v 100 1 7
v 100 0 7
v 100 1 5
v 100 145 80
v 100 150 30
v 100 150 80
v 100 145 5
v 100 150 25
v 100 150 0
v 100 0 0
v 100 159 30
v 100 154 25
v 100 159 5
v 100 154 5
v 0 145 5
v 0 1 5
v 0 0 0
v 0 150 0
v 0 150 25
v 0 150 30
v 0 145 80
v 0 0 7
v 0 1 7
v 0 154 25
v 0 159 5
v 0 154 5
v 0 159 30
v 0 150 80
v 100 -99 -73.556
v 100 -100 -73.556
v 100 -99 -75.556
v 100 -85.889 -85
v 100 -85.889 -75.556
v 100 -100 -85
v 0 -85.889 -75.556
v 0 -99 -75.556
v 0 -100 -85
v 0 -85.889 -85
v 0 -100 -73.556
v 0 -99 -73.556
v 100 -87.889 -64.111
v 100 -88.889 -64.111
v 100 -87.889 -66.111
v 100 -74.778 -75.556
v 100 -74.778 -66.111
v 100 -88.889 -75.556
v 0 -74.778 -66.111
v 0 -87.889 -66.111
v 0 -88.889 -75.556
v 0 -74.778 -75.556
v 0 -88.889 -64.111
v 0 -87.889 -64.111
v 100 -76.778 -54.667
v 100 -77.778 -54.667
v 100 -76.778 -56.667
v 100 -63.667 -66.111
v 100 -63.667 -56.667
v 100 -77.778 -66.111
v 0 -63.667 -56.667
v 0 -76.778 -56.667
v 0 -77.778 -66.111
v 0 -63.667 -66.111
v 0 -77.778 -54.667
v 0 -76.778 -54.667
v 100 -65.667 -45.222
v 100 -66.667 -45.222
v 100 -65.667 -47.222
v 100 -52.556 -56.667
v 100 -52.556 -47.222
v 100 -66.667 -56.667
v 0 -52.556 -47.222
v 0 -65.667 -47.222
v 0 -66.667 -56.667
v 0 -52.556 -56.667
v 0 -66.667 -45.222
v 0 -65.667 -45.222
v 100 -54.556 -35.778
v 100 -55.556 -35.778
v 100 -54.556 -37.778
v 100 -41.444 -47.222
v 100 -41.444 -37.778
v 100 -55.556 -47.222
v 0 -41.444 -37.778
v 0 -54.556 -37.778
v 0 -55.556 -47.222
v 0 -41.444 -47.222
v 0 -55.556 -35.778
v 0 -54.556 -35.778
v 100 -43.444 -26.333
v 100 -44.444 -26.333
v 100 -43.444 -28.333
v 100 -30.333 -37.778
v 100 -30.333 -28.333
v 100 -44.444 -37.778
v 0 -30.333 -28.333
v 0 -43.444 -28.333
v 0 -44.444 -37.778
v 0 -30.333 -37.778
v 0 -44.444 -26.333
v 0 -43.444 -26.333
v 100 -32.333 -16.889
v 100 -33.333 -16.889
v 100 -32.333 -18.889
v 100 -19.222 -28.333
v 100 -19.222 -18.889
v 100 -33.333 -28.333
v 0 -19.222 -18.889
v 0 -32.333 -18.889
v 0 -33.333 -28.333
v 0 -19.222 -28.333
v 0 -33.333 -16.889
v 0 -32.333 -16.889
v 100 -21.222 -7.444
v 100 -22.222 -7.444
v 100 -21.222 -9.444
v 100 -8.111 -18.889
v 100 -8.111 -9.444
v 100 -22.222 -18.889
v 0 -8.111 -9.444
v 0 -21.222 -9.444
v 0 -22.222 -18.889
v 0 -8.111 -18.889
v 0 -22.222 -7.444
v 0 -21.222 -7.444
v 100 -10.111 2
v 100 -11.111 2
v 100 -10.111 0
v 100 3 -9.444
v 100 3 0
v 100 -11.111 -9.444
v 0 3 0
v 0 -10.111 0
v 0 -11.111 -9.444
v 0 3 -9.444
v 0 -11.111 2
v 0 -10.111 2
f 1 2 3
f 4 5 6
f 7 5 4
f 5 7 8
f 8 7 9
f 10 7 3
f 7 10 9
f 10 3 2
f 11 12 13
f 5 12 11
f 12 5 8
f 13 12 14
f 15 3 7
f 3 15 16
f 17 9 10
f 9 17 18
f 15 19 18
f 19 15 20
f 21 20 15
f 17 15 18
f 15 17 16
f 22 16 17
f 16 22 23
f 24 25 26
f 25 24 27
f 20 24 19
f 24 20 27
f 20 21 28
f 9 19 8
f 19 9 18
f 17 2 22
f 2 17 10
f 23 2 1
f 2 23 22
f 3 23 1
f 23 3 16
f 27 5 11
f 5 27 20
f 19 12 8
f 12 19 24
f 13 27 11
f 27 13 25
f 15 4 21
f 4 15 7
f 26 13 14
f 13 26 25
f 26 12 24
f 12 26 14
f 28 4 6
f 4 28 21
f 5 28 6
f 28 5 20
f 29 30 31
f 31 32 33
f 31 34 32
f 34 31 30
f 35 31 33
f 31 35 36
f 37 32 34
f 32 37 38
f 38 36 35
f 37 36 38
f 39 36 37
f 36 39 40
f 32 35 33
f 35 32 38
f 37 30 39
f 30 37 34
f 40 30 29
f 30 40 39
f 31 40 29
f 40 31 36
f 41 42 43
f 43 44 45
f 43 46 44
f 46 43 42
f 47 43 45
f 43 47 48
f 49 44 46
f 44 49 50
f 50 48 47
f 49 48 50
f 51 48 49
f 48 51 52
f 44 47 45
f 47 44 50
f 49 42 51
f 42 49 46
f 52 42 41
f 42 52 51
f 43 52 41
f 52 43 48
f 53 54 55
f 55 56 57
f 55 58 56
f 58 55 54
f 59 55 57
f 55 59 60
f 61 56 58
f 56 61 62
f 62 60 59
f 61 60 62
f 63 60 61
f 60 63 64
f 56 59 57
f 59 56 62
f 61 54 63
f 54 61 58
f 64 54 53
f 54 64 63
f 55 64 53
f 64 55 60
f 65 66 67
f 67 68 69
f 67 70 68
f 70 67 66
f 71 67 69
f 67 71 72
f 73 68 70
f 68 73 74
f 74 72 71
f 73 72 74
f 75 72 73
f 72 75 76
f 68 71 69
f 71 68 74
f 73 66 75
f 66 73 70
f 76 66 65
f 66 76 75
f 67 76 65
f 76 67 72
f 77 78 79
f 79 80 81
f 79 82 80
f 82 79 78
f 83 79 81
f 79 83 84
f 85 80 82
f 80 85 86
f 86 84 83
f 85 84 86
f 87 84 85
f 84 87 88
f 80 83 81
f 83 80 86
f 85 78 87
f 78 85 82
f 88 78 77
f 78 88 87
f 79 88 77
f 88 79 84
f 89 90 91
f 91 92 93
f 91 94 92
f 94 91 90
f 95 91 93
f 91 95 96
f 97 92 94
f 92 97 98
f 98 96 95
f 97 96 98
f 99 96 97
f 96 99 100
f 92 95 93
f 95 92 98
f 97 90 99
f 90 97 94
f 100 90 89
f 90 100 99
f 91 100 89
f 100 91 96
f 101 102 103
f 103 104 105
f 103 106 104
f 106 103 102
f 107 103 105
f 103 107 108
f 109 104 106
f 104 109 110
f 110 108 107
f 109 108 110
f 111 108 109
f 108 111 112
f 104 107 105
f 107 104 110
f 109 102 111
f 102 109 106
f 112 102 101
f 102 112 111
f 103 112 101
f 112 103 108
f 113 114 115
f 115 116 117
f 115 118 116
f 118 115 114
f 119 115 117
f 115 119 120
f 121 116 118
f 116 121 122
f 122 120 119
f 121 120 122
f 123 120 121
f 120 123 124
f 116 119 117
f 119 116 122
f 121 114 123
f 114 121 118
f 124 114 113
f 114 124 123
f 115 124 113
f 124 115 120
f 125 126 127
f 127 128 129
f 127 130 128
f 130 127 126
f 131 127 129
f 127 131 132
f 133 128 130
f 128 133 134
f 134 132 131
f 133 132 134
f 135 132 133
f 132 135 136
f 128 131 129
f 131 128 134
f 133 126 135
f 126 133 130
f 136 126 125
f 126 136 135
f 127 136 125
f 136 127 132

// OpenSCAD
// Turtle Basking Spot for Aquarium
// All dimensions are parameterized for customization

// ===== PARAMETERS =====
// Main platform dimensions
platform_length = 100;     // Length of the basking platform (mm)
platform_width = 150;       // Width of the basking platform (mm)
platform_thickness = 5;    // Thickness of the platform (mm)

// Wall dimensions
wall_height = 20;          // Height of the back wall (mm)
wall_thickness = 5;        // Thickness of the wall (mm)
upper_wall_height = 50;    // Height of the upper wall above the hook (mm)

// Glass hook dimensions
hook_drop = 20;            // How far the hook drops down behind the glass (mm)
hook_thickness = 5;        // Thickness of the hook (mm)
glass_thickness = 4;       // Thickness of aquarium glass (mm)

// Ramp/stairs dimensions
ramp_width = 100;           // Width of the ramp (mm)
ramp_height = 85;         // Total depth of the ramp (how far down from platform) (mm)
ramp_length = 100;        // Total length of the steps area (mm)

// Ridge dimensions for better grip
ridge_height = 2;          // Height of ridges above step surface (mm)
ridge_width = 1;           // Width/thickness of each ridge (mm)

// ===== MAIN ASSEMBLY =====
turtle_basking_spot();

// Ramp/stairs positioned at the front of the platform
translate([platform_length/2 - ramp_width/2, -ramp_length, 0])
    ramp_stairs();

// ===== MODULES =====
module turtle_basking_spot() {
    union() {
        // Main platform
        basking_platform();
        
        // Back wall with glass hook
        translate([0, platform_width - wall_thickness, platform_thickness])
            back_wall_with_hook();
    }
}

module basking_platform() {
    union() {
        // Simple flat platform
        cube([platform_length, platform_width, platform_thickness]);
        
        // Add ridge at front edge for better grip
        translate([0, 0, platform_thickness])
            cube([platform_length, ridge_width, ridge_height]);
    }
}

module back_wall_with_hook() {
    union() {
        // Main wall
        cube([platform_length, wall_thickness, wall_height]);
        
        // Glass hook at the top
        translate([0, 0, wall_height])
            glass_hook();
        
        // Upper wall above the hook
        translate([0, 0, wall_height + hook_thickness])
            cube([platform_length, wall_thickness, upper_wall_height]);
    }
}

module glass_hook() {
    // L-shaped hook that goes over the glass edge with gap for glass
    union() {
        // Horizontal part (goes over the glass, extends to accommodate glass + hook material)
        translate([0, 0, 0])
            cube([platform_length, wall_thickness + glass_thickness + hook_thickness, hook_thickness]);
        
        // Vertical part (drops down behind the glass, positioned to create proper glass gap)
        translate([0, wall_thickness + glass_thickness, -hook_drop])
            cube([platform_length, hook_thickness, hook_drop]);
    }
}

module ramp_stairs() {
    // Calculate starting position - ramp goes down from platform level
    ramp_start_height = -ramp_height;

    // Calculate optimal step count and dimensions
    calculated_step_count = max(1, round(ramp_height / 10));
    actual_step_height = ramp_height / calculated_step_count;
    actual_step_length = ramp_length / calculated_step_count;
    
    // Create overlapping steps to prevent gaps
    for (i = [0 : calculated_step_count - 1]) {
        // Calculate step position
        step_y_position = i * actual_step_length;
        step_z_position = ramp_start_height + (i * actual_step_height);
        
        // Make each step extend to connect properly
        step_length_with_overlap = (i == calculated_step_count - 1) ? 
            ramp_length - step_y_position + 3 : actual_step_length + 3;
        
        translate([0, step_y_position, step_z_position])
            ridged_step(ramp_width, step_length_with_overlap, actual_step_height);
    }

}

module ridged_step(width, length, height) {
    union() {
        // Base step
        cube([width, length, height]);
        
        // Add ridges on top for better grip
        translate([0, 0, height])
            ridges_on_step(width, length);
    }
}

module ridges_on_step(width, length) {
    // Single ridge at the front edge of the step for better grip
    translate([0, 0, 0])
        cube([width, ridge_width, ridge_height]);
}

// ===== CUSTOMIZATION NOTES =====
// To customize this design:
// 1. Adjust platform_length and platform_width for your aquarium size
// 2. Modify wall_height based on your turtle's size
// 3. Set upper_wall_height for the wall above the hook
// 4. Adjust hook_drop for how far it extends behind the glass
// 5. Set glass_thickness to match your aquarium glass thickness
// 6. Configure ramp_width for the ramp width
// 7. Set ramp_height to control how deep the ramp goes (distance down from platform)
// 8. Set ramp_length for the total ramp length
// 9. Adjust ridge_height and ridge_width for better grip on step edges
// 10. All measurements are in millimeters
